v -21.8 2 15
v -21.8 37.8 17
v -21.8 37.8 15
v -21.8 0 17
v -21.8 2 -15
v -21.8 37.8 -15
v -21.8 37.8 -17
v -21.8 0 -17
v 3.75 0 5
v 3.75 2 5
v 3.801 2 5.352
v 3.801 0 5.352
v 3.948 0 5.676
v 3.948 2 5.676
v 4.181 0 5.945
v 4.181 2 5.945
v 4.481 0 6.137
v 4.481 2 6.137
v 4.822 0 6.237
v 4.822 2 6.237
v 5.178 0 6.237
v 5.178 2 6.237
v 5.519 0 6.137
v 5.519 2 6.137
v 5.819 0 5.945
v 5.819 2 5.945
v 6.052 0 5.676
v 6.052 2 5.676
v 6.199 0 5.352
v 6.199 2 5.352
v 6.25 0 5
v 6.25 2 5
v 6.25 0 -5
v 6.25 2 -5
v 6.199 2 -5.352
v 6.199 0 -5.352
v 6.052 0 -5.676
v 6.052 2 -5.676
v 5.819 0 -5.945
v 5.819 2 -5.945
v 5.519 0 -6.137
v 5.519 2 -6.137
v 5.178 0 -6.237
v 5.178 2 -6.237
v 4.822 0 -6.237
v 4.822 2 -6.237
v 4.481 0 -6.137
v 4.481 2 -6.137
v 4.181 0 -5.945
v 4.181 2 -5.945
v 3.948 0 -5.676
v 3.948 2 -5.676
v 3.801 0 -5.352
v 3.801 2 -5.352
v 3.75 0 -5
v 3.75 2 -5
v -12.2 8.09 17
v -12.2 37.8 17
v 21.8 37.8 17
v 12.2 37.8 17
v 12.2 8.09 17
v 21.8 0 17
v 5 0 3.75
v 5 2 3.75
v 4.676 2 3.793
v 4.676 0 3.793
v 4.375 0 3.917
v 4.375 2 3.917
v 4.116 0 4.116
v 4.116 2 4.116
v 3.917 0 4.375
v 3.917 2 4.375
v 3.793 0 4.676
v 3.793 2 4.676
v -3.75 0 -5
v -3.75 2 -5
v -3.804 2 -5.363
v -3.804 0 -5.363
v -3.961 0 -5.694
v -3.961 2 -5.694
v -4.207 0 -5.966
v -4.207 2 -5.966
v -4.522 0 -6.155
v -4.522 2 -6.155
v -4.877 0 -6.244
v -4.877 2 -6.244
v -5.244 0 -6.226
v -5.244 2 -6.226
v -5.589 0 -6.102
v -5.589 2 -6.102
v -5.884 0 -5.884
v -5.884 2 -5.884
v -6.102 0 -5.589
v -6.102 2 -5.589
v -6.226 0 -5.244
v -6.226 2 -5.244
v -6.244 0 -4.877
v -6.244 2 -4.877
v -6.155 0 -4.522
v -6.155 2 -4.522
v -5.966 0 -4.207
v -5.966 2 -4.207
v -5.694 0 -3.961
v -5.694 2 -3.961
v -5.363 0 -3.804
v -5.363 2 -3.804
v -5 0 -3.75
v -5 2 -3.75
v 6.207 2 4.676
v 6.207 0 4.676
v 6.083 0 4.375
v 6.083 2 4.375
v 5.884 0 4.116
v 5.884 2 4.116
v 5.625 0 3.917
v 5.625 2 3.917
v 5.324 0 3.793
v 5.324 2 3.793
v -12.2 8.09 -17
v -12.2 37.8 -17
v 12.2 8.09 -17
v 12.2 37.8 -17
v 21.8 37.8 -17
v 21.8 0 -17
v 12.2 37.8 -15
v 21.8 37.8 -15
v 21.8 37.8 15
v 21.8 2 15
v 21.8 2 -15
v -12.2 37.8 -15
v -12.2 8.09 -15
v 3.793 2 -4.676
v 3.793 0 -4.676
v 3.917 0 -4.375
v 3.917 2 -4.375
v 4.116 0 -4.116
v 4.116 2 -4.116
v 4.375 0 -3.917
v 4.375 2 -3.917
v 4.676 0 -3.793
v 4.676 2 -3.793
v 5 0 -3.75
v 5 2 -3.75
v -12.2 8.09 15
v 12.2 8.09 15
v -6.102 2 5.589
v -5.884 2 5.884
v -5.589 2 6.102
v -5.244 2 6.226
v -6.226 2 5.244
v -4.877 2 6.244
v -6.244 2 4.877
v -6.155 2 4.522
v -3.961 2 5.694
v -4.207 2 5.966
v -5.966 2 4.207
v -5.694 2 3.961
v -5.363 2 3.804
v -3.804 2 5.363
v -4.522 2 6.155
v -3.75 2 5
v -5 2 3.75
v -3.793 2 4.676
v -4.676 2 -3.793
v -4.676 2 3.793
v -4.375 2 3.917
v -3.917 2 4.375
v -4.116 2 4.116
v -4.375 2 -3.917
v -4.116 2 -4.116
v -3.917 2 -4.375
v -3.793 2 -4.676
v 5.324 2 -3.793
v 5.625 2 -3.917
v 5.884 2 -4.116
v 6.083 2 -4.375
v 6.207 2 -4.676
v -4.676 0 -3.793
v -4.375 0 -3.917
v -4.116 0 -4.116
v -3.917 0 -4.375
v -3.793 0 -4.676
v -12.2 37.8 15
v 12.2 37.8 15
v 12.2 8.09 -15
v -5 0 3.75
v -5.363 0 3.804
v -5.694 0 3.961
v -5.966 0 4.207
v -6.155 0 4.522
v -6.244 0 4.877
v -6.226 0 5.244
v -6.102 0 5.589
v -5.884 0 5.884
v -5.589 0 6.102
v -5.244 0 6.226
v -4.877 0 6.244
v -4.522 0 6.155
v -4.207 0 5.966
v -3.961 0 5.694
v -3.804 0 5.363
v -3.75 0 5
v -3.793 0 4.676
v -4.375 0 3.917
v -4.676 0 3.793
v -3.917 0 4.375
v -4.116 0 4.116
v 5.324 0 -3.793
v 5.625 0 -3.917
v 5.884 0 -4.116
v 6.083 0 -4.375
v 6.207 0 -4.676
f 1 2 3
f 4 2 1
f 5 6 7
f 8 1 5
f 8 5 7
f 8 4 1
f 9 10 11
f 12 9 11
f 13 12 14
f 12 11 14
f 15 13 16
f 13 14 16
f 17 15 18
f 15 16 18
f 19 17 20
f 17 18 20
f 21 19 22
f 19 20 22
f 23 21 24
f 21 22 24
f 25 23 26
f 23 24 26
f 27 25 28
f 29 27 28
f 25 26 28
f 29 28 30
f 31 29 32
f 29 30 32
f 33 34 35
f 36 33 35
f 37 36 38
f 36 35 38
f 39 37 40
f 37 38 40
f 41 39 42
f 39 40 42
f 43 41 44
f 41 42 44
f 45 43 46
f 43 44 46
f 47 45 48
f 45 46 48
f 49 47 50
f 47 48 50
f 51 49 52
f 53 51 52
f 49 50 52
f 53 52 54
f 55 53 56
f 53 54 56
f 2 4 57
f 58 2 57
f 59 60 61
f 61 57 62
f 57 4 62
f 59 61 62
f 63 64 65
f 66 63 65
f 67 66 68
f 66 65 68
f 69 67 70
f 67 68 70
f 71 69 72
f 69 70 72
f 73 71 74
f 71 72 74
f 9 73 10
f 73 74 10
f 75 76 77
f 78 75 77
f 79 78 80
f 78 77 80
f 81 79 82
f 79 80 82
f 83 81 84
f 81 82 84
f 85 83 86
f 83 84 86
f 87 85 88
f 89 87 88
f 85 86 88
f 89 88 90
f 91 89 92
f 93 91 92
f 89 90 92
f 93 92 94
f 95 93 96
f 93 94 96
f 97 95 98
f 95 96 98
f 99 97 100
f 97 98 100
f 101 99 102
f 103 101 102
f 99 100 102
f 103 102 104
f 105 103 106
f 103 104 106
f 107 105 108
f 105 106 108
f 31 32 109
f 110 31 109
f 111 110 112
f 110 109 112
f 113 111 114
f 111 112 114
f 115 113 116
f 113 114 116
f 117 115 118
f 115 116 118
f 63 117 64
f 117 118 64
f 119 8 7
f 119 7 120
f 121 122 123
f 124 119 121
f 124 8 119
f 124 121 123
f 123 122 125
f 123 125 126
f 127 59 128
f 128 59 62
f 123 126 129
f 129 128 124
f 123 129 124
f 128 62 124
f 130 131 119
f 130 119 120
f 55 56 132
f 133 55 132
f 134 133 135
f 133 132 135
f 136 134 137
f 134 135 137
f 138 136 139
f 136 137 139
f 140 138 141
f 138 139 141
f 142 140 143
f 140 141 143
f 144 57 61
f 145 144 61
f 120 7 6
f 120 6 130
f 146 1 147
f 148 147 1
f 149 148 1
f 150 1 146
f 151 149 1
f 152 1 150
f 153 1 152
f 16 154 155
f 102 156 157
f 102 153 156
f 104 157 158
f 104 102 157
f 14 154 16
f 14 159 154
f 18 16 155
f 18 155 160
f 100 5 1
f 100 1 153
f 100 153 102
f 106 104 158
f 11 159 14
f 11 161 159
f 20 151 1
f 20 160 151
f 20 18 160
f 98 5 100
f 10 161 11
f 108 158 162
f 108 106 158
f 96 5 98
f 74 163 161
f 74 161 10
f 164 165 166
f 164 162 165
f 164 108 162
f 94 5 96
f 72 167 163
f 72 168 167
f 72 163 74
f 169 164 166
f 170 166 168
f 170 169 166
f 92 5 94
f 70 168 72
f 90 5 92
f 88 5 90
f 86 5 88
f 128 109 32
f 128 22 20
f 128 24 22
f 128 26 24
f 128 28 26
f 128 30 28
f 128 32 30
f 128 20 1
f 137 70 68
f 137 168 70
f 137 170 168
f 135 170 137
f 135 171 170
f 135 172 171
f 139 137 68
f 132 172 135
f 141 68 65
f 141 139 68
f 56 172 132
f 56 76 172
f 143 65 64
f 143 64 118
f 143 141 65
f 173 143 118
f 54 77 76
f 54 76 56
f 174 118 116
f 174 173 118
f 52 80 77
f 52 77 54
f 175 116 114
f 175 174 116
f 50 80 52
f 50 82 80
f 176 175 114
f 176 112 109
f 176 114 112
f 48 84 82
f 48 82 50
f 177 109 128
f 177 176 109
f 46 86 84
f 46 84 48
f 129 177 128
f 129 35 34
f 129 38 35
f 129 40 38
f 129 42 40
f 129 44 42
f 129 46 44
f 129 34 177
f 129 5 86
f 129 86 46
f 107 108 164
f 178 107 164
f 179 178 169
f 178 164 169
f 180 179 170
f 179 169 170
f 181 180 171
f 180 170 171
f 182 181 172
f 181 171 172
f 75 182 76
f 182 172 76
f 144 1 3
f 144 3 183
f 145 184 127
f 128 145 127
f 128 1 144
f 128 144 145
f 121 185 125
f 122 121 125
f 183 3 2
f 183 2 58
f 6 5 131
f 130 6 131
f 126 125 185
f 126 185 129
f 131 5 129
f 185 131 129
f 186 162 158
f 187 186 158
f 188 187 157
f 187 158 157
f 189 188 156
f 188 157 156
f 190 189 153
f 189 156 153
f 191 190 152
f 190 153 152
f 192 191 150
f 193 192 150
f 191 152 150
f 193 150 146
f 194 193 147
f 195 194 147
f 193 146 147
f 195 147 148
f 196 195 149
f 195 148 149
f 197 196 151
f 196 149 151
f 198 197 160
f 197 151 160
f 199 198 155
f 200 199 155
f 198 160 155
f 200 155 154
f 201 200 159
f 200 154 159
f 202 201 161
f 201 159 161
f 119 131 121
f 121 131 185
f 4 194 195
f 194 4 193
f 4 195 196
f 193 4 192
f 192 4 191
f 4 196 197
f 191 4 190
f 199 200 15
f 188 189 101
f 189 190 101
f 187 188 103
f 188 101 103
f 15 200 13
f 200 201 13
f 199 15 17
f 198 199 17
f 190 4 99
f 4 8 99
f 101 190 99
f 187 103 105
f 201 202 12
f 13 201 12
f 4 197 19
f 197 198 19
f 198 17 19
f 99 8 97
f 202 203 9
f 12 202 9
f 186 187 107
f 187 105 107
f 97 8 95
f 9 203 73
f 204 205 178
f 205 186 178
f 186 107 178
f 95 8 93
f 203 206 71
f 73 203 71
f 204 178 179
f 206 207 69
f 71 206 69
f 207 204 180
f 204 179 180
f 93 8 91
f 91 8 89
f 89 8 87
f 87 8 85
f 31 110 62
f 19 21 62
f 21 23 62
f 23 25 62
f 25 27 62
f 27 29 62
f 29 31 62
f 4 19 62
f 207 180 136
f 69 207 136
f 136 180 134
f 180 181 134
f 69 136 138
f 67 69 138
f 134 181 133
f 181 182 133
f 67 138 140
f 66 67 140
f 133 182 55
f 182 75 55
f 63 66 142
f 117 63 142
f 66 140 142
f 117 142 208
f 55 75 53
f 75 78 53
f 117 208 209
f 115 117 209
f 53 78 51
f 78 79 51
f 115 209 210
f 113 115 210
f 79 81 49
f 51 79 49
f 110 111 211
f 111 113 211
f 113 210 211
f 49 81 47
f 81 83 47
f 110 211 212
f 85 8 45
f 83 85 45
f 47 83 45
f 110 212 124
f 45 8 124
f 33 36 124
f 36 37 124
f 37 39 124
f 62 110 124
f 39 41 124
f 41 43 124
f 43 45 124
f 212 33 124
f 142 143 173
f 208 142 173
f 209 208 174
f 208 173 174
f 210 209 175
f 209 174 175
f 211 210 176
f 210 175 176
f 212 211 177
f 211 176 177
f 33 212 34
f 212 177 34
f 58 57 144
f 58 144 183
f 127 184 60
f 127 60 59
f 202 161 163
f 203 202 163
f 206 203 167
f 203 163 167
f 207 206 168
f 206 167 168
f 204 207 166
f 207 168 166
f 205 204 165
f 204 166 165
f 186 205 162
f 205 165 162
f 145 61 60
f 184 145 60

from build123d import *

# Parameters (mm, degrees)
SKETCH1_W           = 43.6
SKETCH1_H           = 34
BOSS_EXTRUDE1_DEPTH = 2
SKETCH2_W           = 43.6
SKETCH2_H           = 2
BOSS_EXTRUDE2_DEPTH = 35.8
SKETCH3_W           = 12.2
SKETCH3_H           = 29.71
CUT_EXTRUDE2_DEPTH  = 66.8
CUT_EXTRUDE3_DEPTH  = 66.8


with BuildPart() as part:
    # Sketch1 → Boss-Extrude1 (new body)
    with BuildSketch(Plane(origin=(0, 0, 0), x_dir=(1, 0, 0), z_dir=(0, 1, 0))):
        Rectangle(SKETCH1_W, SKETCH1_H)
    extrude(amount=BOSS_EXTRUDE1_DEPTH)

    # Sketch2 → Boss-Extrude2 (add)
    with BuildSketch(Plane(origin=(0, 2, 0), x_dir=(1, 0, 0), z_dir=(0, 1, 0))):
        with Locations((0, 16)):
            Rectangle(SKETCH2_W, SKETCH2_H)
        with Locations((0, -16)):
            Rectangle(SKETCH2_W, SKETCH2_H)
    extrude(amount=BOSS_EXTRUDE2_DEPTH)

    # Sketch3 → Cut-Extrude2 (cut)
    with BuildSketch(Plane.XY.offset(17)):
        with Locations((-6.1, 22.945)):
            Rectangle(SKETCH3_W, SKETCH3_H)
        with Locations((6.1, 22.945)):
            Rectangle(SKETCH3_W, SKETCH3_H)
    extrude(amount=-CUT_EXTRUDE2_DEPTH, mode=Mode.SUBTRACT)

    # Sketch4 → Cut-Extrude3 (cut)
    with BuildSketch(Plane(origin=(0, 2, 0), x_dir=(1, 0, 0), z_dir=(0, 1, 0))):
        with BuildLine():
            ThreePointArc((-3.75, 5), (-5.883883476, 5.883883476), (-5, 3.75))
            Line((-5, 3.75), (-5, 5))
            Line((-5, 5), (-3.75, 5))
        make_face()
        with BuildLine():
            Line((-5, 5), (-5, 3.75))
            ThreePointArc((-5, 3.75), (-4.116116524, 4.116116524), (-3.75, 5))
            Line((-3.75, 5), (-5, 5))
        make_face()
        with BuildLine():
            ThreePointArc((3.75, 5), (4.116116524, 4.116116524), (5, 3.75))
            Line((5, 3.75), (5, 5))
            Line((5, 5), (3.75, 5))
        make_face()
        with BuildLine():
            Line((5, 5), (5, 3.75))
            ThreePointArc((5, 3.75), (5.883883476, 4.116116524), (6.25, 5))
            ThreePointArc((6.25, 5), (5, 6.25), (3.75, 5))
            Line((3.75, 5), (5, 5))
        make_face()
        with BuildLine():
            Line((-5, -3.75), (-5, -5))
            Line((-5, -5), (-3.75, -5))
            ThreePointArc((-3.75, -5), (-4.116116524, -4.116116524), (-5, -3.75))
        make_face()
        with BuildLine():
            Line((-3.75, -5), (-5, -5))
            Line((-5, -5), (-5, -3.75))
            ThreePointArc((-5, -3.75), (-5.883883476, -5.883883476), (-3.75, -5))
        make_face()
        with BuildLine():
            ThreePointArc((5, -3.75), (4.116116524, -4.116116524), (3.75, -5))
            Line((3.75, -5), (5, -5))
            Line((5, -5), (5, -3.75))
        make_face()
        with BuildLine():
            Line((5, -5), (3.75, -5))
            ThreePointArc((3.75, -5), (5, -6.25), (6.25, -5))
            ThreePointArc((6.25, -5), (5.883883476, -4.116116524), (5, -3.75))
            Line((5, -3.75), (5, -5))
        make_face()
    extrude(amount=-CUT_EXTRUDE3_DEPTH, mode=Mode.SUBTRACT)


solid = part.part
